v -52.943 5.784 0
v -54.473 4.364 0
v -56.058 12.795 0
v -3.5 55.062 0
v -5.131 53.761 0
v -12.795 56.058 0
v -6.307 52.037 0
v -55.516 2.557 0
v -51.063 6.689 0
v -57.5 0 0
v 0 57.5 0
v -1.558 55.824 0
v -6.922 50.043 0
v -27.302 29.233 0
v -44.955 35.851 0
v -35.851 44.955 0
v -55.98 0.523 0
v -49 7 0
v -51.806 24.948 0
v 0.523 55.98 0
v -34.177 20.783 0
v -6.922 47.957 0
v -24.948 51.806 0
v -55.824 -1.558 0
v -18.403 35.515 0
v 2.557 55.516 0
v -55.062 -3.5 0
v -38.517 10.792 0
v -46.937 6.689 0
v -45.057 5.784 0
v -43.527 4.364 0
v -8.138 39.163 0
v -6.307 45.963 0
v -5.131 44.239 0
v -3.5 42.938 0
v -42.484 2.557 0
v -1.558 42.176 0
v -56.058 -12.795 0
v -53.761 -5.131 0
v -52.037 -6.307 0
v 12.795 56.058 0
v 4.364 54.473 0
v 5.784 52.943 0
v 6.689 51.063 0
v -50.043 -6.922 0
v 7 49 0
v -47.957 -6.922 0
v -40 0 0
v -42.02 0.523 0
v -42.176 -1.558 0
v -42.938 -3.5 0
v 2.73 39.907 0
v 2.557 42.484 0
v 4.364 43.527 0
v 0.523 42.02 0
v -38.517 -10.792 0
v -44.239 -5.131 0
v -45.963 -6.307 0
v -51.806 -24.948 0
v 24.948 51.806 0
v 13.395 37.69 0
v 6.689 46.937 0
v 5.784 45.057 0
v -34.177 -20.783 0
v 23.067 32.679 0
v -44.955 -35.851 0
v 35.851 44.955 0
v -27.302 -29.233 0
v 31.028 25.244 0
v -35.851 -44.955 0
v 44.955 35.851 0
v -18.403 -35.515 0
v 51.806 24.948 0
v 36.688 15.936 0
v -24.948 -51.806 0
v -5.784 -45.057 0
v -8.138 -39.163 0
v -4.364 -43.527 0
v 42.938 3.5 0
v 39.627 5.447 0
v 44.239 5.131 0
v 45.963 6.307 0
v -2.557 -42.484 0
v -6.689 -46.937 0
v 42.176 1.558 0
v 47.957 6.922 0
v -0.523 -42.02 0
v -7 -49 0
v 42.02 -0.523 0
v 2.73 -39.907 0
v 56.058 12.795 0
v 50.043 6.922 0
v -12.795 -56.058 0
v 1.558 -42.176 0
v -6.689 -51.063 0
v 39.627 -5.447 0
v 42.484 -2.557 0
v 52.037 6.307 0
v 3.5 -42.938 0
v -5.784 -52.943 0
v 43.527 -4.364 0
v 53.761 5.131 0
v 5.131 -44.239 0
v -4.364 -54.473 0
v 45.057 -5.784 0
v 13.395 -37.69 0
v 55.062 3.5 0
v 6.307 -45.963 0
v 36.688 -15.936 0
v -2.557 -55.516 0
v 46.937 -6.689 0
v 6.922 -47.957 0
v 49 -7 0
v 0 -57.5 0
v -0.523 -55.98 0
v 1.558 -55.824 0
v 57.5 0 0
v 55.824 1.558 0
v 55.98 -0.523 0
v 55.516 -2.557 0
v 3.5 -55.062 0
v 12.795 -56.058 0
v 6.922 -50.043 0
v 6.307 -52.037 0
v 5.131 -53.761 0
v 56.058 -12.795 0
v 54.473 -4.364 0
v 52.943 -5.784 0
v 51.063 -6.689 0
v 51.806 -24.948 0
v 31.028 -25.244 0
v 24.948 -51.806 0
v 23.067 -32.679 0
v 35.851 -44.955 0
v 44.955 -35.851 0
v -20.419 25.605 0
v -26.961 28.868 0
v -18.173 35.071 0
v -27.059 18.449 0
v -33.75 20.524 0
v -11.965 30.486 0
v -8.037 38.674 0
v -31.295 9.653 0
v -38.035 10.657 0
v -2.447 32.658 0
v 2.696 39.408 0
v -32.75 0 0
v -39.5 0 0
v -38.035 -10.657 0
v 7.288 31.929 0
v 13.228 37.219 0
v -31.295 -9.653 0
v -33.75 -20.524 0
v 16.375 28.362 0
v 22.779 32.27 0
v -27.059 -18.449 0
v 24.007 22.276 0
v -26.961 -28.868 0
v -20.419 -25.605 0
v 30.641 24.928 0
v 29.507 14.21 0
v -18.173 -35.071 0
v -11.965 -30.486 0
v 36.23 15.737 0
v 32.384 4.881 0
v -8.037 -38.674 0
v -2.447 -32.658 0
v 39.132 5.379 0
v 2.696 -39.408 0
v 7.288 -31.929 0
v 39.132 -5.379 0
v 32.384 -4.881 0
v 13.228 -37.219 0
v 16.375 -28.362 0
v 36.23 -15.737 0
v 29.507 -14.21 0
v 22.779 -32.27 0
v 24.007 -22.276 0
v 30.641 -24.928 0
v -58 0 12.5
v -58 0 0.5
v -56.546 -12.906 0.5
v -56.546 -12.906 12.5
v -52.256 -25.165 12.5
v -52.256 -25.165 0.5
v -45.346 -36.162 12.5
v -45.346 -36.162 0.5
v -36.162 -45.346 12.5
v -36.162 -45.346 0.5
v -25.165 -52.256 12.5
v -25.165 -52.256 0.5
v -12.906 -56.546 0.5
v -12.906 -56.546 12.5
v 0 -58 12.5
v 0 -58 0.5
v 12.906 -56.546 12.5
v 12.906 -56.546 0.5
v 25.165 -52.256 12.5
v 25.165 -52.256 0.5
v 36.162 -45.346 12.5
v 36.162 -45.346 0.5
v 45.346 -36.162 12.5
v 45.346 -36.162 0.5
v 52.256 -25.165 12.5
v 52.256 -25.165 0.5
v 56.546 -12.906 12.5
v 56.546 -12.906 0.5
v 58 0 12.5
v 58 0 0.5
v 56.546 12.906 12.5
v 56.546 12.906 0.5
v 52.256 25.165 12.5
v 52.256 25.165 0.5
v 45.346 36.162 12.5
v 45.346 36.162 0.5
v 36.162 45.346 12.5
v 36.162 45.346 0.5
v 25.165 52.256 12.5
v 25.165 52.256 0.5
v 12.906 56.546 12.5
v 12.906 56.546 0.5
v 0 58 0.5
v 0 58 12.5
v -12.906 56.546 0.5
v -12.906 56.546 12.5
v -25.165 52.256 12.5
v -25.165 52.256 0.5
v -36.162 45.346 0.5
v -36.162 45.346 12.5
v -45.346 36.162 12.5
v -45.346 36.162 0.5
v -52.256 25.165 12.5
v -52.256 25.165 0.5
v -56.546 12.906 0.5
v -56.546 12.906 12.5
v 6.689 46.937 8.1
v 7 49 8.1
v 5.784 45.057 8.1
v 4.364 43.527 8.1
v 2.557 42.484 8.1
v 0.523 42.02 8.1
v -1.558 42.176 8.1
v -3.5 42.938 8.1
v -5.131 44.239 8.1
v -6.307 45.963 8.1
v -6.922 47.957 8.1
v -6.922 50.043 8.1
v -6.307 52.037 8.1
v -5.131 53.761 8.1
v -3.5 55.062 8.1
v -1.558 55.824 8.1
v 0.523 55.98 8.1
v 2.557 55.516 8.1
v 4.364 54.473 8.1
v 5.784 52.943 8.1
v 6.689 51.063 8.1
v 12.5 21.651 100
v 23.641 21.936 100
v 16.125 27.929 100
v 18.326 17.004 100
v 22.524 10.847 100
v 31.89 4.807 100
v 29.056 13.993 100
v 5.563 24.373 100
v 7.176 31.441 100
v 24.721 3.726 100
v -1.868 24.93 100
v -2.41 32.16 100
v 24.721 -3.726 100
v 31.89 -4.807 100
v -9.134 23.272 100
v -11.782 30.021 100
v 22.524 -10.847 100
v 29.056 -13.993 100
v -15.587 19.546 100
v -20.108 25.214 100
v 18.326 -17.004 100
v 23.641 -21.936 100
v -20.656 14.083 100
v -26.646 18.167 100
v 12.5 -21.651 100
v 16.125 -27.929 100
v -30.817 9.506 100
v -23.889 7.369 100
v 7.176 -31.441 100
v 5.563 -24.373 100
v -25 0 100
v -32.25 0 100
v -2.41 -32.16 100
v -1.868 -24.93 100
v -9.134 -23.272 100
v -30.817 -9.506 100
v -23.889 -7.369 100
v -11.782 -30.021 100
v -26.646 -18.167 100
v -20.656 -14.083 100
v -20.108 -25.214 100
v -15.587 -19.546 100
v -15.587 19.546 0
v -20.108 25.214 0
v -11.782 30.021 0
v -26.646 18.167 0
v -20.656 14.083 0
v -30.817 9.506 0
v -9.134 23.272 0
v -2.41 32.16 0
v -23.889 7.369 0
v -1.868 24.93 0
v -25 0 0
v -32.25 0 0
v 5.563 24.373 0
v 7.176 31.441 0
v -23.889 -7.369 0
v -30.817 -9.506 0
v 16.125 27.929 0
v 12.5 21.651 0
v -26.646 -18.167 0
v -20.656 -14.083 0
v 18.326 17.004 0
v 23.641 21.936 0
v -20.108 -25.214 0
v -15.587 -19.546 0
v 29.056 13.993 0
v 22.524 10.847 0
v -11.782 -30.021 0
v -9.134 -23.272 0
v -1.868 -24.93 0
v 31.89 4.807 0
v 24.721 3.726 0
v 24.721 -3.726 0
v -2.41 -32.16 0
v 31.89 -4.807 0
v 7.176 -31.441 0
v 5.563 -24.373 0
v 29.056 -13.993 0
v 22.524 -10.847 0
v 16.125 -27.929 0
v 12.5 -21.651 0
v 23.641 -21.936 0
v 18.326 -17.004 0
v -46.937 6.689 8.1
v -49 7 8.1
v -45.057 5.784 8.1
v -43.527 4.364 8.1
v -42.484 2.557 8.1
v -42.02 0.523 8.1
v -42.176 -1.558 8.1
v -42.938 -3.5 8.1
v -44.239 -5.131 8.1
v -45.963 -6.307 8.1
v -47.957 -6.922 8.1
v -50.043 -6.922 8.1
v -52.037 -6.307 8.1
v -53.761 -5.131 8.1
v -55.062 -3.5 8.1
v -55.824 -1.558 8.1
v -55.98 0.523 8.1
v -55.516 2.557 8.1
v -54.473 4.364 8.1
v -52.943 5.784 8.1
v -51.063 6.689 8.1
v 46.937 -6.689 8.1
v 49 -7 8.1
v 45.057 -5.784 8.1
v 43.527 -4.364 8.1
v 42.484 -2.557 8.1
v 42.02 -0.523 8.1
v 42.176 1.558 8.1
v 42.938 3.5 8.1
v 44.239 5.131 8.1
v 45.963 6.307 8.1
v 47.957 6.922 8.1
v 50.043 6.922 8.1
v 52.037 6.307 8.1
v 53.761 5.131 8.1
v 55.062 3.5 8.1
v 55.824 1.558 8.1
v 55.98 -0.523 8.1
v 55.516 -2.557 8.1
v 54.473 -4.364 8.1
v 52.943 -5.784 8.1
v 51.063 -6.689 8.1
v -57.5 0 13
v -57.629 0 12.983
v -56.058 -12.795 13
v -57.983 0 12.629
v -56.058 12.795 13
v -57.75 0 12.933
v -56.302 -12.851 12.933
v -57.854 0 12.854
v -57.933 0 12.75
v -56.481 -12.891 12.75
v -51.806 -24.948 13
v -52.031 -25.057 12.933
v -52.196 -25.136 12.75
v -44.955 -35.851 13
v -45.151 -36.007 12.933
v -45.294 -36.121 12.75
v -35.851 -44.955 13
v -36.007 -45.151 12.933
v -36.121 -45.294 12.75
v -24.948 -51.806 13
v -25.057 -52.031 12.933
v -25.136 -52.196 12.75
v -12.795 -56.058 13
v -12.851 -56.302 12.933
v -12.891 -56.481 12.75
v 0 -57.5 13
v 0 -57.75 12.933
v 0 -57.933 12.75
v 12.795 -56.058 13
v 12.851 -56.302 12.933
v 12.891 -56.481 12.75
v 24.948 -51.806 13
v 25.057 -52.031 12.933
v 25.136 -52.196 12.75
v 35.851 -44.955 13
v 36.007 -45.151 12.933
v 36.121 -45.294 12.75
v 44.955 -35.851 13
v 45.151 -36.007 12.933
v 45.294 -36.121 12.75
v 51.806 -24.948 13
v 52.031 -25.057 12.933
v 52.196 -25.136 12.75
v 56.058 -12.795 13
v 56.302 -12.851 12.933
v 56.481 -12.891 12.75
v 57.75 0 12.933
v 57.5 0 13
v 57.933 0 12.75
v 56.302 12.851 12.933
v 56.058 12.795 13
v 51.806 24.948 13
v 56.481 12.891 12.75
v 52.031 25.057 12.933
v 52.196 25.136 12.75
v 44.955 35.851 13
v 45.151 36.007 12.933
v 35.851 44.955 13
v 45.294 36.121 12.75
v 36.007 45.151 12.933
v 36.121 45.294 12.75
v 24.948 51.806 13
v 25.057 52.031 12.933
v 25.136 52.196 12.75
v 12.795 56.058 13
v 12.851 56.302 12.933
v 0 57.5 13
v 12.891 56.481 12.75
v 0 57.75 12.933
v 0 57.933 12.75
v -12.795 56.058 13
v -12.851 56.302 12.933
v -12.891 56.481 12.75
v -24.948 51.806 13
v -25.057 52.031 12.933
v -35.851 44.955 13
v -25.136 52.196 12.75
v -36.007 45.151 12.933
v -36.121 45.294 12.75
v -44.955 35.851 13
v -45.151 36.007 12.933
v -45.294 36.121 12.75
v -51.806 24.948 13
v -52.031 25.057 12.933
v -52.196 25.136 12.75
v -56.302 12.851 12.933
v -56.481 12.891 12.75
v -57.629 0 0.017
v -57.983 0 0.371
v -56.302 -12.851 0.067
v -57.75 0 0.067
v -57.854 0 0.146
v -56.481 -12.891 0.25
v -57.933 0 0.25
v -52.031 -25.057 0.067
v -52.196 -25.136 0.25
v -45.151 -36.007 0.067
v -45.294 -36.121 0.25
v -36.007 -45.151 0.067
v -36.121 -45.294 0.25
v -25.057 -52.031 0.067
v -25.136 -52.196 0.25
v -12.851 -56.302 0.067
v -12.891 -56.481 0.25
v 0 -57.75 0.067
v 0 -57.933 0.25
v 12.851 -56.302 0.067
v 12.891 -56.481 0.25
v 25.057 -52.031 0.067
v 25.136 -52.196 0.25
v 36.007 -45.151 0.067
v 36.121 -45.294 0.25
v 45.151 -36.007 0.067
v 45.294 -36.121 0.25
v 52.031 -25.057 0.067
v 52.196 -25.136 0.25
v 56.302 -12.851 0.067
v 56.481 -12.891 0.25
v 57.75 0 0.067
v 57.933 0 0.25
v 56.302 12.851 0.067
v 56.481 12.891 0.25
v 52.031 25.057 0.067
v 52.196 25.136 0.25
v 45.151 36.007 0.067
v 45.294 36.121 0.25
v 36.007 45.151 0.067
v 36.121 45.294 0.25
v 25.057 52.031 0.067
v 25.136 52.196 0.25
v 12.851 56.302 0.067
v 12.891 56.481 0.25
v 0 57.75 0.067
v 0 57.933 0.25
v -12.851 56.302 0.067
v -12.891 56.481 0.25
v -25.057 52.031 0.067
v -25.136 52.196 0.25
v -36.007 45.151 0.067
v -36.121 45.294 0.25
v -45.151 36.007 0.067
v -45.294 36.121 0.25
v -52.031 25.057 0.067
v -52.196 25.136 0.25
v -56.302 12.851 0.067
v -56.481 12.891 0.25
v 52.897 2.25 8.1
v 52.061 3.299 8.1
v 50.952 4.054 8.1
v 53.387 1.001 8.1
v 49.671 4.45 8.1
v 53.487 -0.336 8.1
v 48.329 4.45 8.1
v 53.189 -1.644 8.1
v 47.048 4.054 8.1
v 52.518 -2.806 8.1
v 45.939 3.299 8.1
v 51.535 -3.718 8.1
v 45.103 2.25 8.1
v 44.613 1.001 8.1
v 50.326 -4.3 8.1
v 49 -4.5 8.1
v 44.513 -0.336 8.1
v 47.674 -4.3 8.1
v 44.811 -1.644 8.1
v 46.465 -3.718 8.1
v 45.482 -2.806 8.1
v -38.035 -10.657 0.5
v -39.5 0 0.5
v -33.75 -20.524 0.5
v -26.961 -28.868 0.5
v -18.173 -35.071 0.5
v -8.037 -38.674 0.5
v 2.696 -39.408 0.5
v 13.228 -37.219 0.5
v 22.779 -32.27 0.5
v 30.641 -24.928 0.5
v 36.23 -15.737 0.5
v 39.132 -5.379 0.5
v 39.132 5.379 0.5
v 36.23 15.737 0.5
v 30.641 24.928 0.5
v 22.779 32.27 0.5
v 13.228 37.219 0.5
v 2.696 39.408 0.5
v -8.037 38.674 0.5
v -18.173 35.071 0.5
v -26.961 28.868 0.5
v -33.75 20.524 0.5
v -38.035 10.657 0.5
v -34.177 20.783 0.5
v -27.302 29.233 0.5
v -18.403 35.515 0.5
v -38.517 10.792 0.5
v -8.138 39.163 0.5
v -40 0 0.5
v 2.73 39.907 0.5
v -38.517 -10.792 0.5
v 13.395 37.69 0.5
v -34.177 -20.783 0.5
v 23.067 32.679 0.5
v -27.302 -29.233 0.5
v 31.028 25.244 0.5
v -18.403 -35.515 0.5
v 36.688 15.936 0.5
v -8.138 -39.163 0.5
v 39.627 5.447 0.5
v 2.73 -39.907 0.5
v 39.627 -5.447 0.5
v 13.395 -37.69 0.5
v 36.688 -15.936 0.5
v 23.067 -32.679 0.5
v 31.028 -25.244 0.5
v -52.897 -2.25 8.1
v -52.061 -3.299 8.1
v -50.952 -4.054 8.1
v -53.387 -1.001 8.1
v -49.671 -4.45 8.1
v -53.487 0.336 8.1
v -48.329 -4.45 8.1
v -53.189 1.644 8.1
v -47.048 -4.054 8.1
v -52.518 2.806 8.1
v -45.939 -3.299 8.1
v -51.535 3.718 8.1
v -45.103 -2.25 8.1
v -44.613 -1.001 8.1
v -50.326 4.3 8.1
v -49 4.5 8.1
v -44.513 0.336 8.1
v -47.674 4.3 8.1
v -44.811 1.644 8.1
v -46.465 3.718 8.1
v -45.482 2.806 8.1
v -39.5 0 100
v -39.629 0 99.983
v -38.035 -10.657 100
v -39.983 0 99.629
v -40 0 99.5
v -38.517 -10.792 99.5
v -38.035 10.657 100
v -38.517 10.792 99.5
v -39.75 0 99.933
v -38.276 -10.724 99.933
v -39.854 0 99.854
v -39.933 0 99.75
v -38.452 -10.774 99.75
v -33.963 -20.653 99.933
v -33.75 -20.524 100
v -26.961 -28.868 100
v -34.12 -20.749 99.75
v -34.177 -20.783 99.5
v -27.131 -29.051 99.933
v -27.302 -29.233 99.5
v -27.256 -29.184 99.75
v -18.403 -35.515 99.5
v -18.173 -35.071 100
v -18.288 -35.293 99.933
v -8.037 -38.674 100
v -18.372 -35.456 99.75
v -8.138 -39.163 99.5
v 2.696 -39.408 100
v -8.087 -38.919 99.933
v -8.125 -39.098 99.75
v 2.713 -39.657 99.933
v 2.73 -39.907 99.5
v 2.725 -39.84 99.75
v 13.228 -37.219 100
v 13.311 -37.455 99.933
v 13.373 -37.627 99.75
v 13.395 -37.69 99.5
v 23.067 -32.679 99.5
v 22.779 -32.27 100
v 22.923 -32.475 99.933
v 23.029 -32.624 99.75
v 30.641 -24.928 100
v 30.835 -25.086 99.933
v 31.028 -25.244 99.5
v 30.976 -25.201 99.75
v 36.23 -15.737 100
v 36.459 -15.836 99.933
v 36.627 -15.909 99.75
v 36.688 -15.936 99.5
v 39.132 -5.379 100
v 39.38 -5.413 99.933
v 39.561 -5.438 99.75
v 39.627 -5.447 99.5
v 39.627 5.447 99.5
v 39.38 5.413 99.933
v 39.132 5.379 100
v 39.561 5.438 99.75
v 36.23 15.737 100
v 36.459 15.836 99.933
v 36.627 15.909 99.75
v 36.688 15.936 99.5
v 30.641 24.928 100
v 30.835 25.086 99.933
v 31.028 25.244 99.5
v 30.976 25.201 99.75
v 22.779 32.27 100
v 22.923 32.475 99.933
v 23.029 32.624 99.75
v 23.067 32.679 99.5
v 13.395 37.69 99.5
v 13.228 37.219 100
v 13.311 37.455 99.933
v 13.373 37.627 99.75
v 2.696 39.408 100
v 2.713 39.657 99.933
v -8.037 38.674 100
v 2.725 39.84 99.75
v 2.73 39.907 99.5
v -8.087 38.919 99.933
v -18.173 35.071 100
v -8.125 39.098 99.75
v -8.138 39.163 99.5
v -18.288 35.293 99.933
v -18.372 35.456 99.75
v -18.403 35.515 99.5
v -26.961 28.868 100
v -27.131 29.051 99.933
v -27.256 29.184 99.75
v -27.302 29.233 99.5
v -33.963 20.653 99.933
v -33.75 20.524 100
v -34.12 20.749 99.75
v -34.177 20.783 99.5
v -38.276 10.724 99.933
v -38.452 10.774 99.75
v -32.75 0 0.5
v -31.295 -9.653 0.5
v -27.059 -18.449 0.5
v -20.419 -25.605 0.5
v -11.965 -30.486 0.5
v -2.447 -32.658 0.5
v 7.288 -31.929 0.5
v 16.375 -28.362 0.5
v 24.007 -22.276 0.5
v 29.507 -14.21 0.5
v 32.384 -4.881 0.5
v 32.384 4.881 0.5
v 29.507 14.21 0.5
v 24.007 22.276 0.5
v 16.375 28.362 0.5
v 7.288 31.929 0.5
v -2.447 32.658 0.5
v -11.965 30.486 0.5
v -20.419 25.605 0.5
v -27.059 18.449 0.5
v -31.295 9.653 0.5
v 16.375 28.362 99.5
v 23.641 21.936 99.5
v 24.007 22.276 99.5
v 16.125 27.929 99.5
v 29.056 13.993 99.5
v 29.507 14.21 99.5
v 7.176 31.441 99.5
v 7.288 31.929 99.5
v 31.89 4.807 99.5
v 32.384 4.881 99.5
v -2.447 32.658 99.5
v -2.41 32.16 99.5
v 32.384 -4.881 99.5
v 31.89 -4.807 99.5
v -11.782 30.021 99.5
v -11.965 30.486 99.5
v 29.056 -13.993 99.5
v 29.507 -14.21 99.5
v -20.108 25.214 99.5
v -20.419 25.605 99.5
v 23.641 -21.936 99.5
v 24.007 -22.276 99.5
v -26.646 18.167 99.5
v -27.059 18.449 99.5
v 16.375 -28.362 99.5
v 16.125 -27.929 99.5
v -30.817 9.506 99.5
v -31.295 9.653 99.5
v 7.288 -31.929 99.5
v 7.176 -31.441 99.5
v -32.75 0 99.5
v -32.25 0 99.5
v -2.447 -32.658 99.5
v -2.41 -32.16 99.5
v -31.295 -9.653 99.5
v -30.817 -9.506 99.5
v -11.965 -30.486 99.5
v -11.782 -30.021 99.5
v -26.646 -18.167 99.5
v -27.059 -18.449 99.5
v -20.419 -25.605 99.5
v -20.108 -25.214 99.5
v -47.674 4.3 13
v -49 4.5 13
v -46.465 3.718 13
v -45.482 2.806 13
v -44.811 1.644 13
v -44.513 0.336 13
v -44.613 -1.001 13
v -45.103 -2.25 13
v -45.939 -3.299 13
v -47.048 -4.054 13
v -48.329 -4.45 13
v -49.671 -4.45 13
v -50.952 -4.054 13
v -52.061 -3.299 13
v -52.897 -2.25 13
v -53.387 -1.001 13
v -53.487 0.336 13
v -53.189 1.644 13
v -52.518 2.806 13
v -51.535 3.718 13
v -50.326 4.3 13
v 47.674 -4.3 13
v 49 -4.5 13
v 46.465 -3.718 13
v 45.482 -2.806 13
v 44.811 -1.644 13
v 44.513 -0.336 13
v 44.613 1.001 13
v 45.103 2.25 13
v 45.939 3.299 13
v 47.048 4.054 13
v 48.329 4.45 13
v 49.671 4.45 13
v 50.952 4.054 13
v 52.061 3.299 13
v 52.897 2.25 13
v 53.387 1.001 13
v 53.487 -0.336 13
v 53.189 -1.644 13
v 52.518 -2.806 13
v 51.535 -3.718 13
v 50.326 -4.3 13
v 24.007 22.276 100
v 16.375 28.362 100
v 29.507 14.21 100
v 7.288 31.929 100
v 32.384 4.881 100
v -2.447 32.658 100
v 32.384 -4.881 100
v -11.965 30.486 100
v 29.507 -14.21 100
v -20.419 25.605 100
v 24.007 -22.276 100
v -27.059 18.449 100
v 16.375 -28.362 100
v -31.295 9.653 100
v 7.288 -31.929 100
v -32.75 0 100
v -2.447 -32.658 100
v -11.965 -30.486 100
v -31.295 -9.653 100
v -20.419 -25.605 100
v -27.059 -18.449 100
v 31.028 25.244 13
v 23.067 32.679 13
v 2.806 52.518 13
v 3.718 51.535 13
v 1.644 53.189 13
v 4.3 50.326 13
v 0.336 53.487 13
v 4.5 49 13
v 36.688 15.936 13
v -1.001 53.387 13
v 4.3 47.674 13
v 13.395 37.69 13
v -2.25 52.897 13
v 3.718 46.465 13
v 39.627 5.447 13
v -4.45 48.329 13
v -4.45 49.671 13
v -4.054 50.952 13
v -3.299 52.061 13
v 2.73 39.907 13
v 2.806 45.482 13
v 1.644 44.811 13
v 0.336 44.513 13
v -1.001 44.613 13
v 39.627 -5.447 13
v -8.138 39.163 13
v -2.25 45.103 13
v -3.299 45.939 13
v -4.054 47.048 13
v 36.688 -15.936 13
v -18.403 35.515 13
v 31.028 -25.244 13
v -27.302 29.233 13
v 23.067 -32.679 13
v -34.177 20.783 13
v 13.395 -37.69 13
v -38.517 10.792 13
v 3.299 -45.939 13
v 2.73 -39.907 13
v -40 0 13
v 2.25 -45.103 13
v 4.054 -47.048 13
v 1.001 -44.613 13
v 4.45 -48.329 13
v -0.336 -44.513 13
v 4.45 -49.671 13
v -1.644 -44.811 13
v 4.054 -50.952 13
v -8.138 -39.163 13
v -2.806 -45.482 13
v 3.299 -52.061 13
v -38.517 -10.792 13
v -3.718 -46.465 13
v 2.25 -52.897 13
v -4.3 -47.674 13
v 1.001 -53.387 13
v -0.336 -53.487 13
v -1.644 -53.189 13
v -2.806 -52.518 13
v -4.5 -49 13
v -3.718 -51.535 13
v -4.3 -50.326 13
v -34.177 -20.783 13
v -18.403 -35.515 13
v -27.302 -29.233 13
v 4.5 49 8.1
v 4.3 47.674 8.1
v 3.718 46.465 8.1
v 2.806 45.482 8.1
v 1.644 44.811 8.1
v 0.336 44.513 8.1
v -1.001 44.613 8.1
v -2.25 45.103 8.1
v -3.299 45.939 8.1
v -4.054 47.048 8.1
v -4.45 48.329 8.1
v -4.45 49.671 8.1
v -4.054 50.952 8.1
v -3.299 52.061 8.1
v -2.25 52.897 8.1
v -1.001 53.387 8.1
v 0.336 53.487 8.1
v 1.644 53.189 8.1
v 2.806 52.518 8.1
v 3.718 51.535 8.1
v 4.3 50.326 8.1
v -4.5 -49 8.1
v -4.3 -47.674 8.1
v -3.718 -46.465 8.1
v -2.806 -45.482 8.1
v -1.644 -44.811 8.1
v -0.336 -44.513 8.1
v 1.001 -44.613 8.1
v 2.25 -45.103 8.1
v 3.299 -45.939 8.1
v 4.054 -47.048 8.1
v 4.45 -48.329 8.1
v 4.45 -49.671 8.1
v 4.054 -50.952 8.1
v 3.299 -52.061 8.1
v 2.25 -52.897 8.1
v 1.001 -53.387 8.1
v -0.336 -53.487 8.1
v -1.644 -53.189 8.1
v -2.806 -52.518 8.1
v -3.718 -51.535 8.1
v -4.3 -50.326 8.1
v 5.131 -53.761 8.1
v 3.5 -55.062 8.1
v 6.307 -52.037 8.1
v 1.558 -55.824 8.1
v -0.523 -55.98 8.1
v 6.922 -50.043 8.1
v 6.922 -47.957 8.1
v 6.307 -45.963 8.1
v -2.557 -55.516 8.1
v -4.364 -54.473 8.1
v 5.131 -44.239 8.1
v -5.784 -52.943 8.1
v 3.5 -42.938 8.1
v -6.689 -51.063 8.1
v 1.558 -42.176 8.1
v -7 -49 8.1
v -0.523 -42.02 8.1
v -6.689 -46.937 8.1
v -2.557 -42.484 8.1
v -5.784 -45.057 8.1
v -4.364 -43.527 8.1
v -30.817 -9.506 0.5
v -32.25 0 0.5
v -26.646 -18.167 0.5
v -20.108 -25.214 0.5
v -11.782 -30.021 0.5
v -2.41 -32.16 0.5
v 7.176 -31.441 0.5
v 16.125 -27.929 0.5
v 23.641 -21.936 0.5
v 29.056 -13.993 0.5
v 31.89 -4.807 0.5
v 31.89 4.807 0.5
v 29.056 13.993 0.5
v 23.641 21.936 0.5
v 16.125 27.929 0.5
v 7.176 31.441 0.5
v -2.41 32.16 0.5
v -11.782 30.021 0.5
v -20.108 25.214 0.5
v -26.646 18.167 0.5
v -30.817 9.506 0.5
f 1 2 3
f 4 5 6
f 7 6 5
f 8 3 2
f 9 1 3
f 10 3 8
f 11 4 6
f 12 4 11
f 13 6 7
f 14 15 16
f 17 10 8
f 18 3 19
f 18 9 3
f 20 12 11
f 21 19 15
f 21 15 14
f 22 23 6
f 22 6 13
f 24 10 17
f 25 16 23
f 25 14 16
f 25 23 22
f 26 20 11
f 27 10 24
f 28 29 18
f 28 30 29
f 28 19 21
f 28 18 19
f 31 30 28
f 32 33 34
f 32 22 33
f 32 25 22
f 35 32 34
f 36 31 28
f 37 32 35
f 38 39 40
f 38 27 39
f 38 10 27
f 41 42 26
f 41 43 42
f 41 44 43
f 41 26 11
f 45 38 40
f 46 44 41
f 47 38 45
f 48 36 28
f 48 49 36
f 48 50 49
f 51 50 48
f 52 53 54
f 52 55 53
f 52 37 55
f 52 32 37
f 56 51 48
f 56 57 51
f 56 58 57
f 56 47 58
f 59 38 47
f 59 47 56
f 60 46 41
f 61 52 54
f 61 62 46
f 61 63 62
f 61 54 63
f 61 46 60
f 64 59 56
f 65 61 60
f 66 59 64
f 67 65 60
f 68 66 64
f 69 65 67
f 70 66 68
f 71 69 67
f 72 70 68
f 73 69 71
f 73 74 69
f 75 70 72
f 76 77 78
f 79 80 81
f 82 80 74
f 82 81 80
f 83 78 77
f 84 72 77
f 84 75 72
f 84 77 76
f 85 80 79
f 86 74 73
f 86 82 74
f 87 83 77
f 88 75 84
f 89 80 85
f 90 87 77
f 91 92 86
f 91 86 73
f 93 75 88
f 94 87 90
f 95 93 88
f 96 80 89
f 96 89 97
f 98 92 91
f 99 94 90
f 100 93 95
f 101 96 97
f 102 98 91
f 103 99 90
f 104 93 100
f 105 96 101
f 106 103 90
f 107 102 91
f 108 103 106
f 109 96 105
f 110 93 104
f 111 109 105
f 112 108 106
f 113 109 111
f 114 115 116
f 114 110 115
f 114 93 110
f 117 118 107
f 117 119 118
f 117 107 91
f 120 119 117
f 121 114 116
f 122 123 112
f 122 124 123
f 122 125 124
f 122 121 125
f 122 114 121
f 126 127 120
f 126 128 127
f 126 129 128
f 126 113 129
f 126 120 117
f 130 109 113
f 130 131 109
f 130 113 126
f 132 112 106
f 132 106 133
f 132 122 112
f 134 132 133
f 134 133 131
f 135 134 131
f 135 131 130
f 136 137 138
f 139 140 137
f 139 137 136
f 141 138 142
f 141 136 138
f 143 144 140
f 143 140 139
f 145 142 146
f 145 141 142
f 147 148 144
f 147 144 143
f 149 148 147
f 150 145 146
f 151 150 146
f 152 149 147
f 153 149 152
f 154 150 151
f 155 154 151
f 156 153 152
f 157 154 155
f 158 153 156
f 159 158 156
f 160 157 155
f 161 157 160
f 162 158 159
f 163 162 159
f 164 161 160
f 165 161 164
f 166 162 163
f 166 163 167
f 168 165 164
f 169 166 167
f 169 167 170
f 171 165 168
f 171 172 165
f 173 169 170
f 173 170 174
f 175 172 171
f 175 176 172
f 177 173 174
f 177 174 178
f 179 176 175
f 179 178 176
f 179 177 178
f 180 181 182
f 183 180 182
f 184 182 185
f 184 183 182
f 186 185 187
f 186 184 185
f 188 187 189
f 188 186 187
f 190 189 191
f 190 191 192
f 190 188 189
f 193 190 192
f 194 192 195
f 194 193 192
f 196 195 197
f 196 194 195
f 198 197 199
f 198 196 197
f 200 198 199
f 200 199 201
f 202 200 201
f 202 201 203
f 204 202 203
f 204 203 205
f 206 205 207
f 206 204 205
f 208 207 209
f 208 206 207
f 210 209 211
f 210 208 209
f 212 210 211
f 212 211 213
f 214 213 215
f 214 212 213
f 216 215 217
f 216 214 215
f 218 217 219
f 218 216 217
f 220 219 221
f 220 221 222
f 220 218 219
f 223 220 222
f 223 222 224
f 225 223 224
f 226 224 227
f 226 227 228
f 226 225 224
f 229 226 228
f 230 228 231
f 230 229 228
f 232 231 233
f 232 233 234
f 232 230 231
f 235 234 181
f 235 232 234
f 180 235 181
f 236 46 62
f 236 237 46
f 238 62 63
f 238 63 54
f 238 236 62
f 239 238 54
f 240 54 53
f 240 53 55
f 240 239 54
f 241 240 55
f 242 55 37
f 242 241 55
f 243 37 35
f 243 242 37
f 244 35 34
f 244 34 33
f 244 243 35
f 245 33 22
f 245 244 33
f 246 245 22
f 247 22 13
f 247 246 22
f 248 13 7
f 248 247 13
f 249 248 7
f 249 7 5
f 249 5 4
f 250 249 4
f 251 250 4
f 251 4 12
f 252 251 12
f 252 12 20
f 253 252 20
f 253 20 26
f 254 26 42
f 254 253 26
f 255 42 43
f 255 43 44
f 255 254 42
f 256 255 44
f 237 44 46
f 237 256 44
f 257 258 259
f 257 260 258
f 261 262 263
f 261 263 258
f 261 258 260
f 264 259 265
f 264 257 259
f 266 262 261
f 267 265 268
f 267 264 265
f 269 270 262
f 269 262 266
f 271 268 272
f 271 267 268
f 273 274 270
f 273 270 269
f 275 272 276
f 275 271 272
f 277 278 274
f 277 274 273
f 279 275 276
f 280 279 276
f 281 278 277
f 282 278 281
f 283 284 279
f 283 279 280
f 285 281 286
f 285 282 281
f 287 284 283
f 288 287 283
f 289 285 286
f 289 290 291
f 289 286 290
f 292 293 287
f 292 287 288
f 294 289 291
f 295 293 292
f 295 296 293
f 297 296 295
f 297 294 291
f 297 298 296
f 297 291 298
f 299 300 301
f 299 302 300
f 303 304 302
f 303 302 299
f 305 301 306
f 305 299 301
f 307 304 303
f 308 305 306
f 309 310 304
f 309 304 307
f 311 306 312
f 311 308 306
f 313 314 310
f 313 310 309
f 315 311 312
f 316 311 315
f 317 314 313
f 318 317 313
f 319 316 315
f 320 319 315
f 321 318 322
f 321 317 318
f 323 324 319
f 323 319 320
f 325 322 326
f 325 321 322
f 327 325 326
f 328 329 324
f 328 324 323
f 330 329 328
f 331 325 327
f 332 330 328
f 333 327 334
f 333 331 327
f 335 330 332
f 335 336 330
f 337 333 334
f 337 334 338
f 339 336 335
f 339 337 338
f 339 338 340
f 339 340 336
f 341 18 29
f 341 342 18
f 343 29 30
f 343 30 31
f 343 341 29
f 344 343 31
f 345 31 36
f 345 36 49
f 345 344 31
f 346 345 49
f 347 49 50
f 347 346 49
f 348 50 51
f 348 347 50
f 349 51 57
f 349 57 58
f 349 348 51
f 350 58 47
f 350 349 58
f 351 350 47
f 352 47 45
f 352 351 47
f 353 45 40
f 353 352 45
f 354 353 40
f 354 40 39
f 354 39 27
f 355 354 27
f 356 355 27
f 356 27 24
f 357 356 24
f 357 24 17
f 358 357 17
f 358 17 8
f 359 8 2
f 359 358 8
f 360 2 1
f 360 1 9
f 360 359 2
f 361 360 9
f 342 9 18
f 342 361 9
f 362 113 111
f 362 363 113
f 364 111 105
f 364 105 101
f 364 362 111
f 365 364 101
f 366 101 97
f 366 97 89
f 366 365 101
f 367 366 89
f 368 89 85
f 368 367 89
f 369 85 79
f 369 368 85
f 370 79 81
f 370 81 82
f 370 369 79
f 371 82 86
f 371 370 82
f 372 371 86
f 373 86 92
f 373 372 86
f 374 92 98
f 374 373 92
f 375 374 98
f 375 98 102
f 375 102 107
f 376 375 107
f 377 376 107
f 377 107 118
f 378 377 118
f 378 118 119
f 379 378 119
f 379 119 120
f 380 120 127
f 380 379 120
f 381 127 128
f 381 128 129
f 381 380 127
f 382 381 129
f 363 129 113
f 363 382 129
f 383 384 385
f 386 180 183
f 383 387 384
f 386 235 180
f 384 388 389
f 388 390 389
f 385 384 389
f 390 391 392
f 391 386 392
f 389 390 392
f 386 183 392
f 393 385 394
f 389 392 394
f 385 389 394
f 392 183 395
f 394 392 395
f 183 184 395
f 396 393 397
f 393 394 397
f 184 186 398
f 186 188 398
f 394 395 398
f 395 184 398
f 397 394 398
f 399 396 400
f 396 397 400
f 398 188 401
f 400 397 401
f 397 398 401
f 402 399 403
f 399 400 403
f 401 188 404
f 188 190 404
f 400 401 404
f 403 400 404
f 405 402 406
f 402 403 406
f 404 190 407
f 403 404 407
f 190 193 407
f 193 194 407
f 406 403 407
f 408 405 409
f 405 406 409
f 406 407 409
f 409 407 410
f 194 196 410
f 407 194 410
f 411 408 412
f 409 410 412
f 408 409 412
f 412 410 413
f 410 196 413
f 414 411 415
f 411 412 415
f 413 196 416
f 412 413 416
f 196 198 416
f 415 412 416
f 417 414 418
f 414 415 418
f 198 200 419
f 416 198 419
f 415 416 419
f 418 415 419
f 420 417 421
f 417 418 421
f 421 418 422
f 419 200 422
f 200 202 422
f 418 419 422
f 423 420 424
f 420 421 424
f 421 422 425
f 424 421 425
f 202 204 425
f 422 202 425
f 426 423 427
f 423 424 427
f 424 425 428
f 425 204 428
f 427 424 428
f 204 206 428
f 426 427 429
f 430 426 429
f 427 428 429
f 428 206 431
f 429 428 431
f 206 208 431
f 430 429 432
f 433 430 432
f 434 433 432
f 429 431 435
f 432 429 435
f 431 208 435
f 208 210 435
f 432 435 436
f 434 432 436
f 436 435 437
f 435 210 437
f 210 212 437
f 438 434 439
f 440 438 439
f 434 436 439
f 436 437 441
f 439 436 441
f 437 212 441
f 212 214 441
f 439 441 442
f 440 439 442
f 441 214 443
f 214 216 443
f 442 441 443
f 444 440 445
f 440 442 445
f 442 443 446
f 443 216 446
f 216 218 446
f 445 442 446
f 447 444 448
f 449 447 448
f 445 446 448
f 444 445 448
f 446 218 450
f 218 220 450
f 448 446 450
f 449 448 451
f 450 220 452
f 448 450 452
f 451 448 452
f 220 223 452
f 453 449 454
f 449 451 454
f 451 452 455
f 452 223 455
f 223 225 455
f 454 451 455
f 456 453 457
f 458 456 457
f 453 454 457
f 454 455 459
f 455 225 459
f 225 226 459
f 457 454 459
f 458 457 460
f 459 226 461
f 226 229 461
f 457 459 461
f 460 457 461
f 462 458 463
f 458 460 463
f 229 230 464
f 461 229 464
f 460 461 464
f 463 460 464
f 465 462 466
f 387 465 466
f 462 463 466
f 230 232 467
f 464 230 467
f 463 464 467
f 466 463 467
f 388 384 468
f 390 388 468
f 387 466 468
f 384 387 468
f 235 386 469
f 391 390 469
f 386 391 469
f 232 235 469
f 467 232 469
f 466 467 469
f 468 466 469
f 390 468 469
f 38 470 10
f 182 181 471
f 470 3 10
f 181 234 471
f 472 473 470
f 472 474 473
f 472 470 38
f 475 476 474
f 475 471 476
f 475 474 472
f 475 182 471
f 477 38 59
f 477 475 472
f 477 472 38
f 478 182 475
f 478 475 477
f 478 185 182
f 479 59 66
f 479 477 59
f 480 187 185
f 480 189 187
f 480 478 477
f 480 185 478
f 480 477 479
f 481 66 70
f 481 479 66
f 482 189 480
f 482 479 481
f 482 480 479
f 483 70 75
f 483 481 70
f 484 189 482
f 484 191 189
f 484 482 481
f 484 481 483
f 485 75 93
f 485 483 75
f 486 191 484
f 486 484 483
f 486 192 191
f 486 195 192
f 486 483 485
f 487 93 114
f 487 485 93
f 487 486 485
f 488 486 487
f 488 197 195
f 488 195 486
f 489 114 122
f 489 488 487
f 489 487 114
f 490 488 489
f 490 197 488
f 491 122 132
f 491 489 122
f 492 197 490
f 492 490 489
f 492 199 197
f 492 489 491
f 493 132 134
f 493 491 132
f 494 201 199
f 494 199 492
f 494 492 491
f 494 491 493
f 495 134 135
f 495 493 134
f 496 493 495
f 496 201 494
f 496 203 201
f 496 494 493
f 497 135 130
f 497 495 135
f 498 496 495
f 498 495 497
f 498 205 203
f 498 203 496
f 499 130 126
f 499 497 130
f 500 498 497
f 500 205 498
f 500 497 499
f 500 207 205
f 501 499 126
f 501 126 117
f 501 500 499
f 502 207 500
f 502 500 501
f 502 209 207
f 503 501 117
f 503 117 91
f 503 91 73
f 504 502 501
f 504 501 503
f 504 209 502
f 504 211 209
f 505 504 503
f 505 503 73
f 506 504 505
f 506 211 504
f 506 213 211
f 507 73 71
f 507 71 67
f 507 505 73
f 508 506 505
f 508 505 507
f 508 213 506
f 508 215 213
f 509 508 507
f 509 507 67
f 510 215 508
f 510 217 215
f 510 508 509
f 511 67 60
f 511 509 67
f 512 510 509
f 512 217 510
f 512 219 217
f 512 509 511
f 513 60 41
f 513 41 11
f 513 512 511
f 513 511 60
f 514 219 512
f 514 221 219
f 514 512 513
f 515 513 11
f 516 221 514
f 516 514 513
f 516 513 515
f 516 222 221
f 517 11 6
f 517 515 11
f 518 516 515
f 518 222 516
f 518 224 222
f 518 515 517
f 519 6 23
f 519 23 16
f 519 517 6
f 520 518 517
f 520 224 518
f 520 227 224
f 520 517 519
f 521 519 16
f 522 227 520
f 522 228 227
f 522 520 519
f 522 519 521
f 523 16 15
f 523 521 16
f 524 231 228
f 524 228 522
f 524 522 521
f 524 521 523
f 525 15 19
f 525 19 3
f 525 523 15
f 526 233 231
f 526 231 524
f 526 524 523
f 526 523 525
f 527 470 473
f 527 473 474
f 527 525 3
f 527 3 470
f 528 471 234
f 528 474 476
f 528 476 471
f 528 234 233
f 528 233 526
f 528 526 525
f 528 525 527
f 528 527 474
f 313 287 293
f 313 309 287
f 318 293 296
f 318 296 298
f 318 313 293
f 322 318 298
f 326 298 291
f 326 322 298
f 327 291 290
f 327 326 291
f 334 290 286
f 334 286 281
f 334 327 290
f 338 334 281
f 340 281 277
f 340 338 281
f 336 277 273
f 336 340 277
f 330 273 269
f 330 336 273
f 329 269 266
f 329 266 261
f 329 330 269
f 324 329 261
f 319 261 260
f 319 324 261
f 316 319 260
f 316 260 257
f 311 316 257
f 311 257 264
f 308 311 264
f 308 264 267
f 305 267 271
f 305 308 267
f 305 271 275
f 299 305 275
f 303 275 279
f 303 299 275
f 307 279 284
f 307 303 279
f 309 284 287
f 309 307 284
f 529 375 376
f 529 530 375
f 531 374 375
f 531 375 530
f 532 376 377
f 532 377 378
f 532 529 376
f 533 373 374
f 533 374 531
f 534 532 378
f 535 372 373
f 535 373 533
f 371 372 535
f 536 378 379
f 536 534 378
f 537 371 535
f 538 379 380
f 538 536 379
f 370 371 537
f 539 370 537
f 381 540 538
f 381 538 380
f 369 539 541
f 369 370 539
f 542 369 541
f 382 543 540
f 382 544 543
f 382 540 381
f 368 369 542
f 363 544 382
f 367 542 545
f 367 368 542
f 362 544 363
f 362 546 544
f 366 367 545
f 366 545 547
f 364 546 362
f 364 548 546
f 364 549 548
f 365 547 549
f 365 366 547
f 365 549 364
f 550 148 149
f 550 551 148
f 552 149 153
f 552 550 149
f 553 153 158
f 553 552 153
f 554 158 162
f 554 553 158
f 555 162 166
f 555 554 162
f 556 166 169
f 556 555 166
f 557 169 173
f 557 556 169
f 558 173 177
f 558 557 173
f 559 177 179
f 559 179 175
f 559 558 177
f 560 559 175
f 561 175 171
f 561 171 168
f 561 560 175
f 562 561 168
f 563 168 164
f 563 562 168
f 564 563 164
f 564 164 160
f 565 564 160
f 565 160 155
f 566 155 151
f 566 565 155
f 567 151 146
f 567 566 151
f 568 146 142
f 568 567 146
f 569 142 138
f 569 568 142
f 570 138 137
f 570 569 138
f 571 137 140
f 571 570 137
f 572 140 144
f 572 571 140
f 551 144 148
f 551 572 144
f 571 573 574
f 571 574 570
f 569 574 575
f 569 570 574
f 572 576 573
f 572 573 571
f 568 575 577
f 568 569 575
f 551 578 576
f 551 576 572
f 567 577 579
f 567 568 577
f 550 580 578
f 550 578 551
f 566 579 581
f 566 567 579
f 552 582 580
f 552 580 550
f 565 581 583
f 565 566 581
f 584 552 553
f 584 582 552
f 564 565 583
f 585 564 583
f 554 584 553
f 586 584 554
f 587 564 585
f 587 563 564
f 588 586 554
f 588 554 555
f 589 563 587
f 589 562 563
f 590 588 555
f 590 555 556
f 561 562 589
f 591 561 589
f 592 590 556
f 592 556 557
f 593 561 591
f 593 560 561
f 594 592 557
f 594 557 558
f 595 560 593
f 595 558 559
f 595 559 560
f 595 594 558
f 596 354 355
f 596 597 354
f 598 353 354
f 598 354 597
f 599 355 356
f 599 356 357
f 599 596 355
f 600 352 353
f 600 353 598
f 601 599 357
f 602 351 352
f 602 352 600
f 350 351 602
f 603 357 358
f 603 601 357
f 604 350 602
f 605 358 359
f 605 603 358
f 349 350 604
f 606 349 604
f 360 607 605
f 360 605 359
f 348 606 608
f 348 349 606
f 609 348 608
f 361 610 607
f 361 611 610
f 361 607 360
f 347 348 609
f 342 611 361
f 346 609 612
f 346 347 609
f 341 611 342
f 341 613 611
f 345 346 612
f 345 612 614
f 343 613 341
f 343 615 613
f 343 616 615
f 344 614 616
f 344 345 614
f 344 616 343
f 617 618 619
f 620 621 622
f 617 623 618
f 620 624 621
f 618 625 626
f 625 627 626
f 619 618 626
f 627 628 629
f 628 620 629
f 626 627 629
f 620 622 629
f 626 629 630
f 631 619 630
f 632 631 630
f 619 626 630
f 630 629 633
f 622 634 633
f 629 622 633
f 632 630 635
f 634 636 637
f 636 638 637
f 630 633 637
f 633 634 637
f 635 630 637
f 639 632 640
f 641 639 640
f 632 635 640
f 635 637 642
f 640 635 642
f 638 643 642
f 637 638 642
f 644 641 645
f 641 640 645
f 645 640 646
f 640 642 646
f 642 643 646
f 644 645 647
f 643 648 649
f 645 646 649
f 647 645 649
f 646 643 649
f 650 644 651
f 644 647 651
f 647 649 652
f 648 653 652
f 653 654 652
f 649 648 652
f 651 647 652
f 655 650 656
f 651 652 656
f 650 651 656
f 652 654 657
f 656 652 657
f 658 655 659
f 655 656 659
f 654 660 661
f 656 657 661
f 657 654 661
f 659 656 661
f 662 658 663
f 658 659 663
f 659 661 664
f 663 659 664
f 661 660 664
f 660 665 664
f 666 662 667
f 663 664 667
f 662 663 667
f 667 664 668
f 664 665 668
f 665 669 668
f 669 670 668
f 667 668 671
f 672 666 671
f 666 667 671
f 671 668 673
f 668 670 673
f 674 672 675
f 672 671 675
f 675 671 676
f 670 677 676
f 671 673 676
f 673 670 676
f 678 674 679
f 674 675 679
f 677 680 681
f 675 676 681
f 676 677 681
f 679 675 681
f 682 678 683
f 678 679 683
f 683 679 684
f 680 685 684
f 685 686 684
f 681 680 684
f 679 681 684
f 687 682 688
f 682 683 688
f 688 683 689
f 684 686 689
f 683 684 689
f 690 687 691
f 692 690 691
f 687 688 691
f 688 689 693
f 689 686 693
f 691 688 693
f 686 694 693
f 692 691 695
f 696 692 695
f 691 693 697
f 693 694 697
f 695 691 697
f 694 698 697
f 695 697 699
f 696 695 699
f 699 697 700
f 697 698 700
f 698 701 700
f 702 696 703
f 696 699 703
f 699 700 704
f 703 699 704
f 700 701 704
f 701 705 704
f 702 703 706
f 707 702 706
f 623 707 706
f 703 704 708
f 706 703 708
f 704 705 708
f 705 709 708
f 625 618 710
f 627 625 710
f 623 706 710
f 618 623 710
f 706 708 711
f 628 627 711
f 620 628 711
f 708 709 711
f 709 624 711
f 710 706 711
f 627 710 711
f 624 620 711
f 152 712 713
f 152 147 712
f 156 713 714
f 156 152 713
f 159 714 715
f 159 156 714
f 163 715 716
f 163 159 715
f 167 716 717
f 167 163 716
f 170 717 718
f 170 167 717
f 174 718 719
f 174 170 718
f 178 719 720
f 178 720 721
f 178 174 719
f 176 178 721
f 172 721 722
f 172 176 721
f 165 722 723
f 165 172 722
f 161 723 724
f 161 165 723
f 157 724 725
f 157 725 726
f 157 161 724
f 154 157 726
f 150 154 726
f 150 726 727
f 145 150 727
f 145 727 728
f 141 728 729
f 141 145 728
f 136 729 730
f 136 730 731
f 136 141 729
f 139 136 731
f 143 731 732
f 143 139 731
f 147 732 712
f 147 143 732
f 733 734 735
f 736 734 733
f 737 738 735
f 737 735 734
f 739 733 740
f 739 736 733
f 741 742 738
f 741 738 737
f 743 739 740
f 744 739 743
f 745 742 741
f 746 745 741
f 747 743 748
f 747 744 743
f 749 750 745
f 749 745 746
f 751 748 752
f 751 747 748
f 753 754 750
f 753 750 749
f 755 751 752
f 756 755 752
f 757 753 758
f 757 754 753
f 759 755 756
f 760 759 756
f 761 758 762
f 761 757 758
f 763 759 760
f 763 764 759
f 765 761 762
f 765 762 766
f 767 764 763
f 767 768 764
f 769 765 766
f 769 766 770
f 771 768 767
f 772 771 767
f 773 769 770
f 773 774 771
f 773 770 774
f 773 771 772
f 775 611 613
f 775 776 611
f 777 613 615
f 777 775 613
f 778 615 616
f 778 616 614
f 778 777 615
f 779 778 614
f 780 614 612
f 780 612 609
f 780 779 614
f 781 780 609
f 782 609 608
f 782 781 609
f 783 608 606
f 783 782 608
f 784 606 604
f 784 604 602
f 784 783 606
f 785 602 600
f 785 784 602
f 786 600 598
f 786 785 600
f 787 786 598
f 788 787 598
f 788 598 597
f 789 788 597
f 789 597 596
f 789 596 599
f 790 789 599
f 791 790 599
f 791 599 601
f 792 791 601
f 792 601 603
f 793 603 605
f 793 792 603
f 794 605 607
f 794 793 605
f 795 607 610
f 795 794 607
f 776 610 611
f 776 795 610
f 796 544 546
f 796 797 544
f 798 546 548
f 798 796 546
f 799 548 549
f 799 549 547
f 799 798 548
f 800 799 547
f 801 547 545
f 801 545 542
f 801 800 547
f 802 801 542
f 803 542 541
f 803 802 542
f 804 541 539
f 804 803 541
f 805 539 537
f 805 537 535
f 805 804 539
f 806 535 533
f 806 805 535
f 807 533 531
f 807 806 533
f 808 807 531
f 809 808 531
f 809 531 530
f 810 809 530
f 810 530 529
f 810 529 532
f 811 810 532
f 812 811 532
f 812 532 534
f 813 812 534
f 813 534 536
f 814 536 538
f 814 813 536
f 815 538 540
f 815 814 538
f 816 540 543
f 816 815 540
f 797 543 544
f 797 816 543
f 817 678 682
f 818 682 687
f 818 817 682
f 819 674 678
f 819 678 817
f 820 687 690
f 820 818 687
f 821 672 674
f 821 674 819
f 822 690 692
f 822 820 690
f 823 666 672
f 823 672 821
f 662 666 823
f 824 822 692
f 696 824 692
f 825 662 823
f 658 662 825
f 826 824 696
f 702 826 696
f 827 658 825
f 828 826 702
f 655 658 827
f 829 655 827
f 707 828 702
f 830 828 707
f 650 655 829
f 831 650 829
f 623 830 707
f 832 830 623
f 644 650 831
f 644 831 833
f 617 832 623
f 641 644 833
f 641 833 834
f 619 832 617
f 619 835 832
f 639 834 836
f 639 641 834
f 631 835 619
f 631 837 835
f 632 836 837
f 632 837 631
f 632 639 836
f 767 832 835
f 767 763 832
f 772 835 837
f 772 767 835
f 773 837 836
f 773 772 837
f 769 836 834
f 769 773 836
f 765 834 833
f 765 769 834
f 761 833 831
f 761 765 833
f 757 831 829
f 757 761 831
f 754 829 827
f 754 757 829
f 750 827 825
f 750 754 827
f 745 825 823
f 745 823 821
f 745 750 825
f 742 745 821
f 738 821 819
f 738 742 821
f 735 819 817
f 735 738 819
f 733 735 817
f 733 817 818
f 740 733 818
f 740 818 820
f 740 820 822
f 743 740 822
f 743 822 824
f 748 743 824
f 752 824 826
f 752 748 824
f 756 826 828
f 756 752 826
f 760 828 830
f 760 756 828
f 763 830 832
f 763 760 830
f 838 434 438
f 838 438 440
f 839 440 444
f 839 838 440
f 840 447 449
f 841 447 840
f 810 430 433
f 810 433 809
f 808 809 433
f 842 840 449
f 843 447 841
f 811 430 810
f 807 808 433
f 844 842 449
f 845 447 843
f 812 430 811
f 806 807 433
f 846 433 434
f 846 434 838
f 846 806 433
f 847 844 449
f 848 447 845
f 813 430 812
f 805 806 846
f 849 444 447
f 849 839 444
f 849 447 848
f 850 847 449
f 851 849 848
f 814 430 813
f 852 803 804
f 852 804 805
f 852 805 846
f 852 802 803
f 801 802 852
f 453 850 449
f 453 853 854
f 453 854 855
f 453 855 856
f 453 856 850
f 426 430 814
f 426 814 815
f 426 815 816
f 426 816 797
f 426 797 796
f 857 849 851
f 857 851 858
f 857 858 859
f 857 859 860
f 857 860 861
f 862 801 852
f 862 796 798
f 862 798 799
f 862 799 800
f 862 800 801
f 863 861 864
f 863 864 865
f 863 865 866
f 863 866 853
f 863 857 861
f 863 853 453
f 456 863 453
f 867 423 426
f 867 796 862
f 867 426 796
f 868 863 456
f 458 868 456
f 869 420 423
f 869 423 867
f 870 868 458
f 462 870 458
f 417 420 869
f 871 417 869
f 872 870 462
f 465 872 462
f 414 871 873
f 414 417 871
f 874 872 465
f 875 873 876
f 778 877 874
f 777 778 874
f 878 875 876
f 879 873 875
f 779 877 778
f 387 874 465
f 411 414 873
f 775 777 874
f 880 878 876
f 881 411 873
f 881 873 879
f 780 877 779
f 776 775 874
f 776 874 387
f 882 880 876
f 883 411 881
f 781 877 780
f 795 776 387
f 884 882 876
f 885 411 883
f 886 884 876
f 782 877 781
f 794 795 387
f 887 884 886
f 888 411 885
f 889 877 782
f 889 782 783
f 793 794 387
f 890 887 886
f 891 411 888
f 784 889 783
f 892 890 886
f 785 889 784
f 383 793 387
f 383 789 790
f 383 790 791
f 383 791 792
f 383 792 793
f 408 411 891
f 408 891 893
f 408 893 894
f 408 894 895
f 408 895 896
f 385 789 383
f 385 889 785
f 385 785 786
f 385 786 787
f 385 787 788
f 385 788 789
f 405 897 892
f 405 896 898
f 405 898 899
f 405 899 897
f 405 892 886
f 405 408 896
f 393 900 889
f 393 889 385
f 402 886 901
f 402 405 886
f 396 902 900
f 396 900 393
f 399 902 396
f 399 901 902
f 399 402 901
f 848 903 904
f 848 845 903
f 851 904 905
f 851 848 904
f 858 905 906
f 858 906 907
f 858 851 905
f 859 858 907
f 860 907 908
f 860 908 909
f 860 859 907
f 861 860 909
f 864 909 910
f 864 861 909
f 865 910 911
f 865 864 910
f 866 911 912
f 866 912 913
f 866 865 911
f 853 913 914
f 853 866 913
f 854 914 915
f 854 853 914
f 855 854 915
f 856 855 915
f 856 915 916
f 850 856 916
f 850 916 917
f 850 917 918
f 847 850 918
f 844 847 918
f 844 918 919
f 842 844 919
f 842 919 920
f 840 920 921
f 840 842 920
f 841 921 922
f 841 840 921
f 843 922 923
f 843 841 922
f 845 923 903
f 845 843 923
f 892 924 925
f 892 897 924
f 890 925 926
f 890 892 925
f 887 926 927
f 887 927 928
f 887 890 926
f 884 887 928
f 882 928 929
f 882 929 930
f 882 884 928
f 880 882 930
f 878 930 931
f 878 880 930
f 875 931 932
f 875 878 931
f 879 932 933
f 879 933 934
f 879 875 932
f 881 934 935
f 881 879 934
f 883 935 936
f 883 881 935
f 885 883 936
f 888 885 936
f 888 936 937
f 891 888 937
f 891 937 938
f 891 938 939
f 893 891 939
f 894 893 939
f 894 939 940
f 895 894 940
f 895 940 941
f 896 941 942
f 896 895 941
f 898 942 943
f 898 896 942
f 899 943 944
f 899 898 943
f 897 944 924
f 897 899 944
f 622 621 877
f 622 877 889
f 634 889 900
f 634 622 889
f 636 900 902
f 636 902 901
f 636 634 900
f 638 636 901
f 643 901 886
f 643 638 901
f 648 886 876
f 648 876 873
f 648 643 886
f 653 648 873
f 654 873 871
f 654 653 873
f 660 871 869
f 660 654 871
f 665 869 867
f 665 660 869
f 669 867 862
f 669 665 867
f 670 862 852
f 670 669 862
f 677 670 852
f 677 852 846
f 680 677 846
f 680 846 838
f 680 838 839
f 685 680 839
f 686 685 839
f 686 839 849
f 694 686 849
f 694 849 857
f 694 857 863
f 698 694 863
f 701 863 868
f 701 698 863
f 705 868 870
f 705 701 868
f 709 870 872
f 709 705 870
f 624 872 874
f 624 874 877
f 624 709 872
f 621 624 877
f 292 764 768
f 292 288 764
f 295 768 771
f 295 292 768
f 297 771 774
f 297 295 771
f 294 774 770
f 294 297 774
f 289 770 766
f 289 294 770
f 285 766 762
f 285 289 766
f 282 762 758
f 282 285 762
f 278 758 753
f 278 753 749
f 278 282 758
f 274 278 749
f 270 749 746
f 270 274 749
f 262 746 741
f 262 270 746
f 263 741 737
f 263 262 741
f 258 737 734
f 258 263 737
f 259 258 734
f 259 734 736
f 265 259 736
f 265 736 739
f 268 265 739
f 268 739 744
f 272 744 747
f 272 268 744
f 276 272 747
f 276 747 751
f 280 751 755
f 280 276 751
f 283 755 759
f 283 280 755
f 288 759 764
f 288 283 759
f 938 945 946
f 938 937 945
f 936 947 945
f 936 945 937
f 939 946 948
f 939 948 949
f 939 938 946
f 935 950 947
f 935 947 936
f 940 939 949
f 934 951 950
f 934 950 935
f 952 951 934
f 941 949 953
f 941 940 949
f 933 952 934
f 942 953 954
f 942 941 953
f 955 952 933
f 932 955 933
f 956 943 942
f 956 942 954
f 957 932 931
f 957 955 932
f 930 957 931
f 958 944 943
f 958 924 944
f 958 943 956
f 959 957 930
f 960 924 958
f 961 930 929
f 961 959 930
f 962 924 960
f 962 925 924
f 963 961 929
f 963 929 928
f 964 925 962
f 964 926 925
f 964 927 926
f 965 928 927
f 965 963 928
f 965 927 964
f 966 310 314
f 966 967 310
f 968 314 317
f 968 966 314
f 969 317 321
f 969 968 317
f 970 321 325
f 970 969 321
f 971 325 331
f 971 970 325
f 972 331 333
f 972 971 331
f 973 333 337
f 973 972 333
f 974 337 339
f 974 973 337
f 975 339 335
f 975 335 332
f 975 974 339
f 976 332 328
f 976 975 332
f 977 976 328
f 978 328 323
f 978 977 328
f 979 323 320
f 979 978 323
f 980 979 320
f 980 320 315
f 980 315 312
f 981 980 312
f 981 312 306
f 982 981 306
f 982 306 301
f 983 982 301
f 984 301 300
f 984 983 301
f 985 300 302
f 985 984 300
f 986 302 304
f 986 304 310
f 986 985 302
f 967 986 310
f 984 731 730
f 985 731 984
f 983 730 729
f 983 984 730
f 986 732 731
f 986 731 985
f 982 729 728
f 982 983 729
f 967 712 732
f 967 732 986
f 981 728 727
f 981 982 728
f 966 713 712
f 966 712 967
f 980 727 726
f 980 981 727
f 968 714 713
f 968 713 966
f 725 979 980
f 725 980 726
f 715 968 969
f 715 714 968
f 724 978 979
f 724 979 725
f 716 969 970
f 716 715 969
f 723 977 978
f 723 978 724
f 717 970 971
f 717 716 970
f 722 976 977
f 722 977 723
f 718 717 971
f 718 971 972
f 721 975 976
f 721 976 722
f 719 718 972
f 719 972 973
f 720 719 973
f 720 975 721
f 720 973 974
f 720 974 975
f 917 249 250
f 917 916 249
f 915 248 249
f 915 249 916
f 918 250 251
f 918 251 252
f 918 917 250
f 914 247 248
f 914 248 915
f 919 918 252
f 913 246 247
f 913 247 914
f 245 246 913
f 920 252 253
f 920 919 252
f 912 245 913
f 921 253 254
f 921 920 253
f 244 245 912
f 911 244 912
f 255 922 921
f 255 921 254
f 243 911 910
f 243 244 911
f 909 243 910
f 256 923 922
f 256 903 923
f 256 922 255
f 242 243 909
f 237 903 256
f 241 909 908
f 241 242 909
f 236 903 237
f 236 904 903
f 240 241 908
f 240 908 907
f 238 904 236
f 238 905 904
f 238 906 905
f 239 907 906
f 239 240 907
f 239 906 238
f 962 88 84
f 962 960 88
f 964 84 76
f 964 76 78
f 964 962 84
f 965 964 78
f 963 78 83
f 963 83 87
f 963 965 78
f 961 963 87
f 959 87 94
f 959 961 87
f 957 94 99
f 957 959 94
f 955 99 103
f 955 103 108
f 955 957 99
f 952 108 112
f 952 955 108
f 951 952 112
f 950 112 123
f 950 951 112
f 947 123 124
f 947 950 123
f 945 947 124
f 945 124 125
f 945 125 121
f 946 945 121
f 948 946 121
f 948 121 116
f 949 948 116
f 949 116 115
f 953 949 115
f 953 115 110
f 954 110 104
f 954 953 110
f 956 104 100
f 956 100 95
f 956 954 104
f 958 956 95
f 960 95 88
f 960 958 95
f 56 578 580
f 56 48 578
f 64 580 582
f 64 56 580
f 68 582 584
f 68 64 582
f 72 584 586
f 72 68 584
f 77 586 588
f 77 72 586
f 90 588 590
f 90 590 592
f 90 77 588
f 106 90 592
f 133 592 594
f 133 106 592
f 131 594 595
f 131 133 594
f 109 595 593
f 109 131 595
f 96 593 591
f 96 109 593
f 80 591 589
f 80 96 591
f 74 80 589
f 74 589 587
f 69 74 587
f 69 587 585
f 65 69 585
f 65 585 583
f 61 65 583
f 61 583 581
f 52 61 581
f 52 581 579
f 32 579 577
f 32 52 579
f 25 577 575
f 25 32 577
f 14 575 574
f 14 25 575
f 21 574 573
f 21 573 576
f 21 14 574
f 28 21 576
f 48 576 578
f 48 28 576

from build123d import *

# Parameters (mm, degrees)
PADR_OCIRCULAR1_COUNT = 4
FILETE1_R             = 0.5


with BuildPart() as part:
    # Esboço1 → Revolução1 (revolve)
    with BuildSketch(Plane(origin=(0, 0, 0), x_dir=(0, 0, -1), z_dir=(1, 0, 0)), mode=Mode.PRIVATE) as revolu_o1_sk:
        Polygon((0, 25), (0, 32.25), (-0.5, 32.25), (-0.5, 32.75), (0, 32.75), (0, 39.5), (-0.5, 39.5), (-0.5, 40), (0, 40), (0, 58), (-13, 58), (-13, 40), (-100, 40), (-100, 32.75), (-99.5, 32.75), (-99.5, 32.25), (-100, 32.25), (-100, 25), align=None)
    revolve(revolu_o1_sk.sketch.rotate(Axis((0, 0, 0), (0, 0, 1)), 90), axis=Axis((0, 0, 0), (0, 0, 1)))  # turned: the seam where the file's is

    # Esboço5 → Corte-Revolução1 (revolve, cut)
    with BuildSketch(Plane(origin=(0, 0, 0), x_dir=(0, 0, -1), z_dir=(1, 0, 0)), mode=Mode.PRIVATE) as corte_revolu_o1_sk:
        Polygon((0, 56), (-8.1, 56), (-8.1, 53.5), (-13, 53.5), (-13, 49), (0, 49), align=None)
    corte_revolu_o1 = revolve(corte_revolu_o1_sk.sketch.rotate(Axis((0, 49, 0), (0, 0, -1)), 90), axis=Axis((0, 49, 0), (0, 0, -1)), mode=Mode.SUBTRACT)  # turned: the seam where the file's is

    # PadrãoCircular1: Corte-Revolução1 ×4 about axis
    padr_ocircular1_axis = Axis((0, 0, 0), (0, 0, 1))
    for i in range(1, PADR_OCIRCULAR1_COUNT):
        add(corte_revolu_o1.rotate(padr_ocircular1_axis, i * 360 / PADR_OCIRCULAR1_COUNT), mode=Mode.SUBTRACT)

    # Filete1
    filete1_edges = [part.edges().sort_by_distance(p)[0] for p in [
        (40, 0, 100),
        (58, 0, 13),
        (58, 0, 0),
    ]]
    fillet(filete1_edges, radius=FILETE1_R)


solid = part.part
